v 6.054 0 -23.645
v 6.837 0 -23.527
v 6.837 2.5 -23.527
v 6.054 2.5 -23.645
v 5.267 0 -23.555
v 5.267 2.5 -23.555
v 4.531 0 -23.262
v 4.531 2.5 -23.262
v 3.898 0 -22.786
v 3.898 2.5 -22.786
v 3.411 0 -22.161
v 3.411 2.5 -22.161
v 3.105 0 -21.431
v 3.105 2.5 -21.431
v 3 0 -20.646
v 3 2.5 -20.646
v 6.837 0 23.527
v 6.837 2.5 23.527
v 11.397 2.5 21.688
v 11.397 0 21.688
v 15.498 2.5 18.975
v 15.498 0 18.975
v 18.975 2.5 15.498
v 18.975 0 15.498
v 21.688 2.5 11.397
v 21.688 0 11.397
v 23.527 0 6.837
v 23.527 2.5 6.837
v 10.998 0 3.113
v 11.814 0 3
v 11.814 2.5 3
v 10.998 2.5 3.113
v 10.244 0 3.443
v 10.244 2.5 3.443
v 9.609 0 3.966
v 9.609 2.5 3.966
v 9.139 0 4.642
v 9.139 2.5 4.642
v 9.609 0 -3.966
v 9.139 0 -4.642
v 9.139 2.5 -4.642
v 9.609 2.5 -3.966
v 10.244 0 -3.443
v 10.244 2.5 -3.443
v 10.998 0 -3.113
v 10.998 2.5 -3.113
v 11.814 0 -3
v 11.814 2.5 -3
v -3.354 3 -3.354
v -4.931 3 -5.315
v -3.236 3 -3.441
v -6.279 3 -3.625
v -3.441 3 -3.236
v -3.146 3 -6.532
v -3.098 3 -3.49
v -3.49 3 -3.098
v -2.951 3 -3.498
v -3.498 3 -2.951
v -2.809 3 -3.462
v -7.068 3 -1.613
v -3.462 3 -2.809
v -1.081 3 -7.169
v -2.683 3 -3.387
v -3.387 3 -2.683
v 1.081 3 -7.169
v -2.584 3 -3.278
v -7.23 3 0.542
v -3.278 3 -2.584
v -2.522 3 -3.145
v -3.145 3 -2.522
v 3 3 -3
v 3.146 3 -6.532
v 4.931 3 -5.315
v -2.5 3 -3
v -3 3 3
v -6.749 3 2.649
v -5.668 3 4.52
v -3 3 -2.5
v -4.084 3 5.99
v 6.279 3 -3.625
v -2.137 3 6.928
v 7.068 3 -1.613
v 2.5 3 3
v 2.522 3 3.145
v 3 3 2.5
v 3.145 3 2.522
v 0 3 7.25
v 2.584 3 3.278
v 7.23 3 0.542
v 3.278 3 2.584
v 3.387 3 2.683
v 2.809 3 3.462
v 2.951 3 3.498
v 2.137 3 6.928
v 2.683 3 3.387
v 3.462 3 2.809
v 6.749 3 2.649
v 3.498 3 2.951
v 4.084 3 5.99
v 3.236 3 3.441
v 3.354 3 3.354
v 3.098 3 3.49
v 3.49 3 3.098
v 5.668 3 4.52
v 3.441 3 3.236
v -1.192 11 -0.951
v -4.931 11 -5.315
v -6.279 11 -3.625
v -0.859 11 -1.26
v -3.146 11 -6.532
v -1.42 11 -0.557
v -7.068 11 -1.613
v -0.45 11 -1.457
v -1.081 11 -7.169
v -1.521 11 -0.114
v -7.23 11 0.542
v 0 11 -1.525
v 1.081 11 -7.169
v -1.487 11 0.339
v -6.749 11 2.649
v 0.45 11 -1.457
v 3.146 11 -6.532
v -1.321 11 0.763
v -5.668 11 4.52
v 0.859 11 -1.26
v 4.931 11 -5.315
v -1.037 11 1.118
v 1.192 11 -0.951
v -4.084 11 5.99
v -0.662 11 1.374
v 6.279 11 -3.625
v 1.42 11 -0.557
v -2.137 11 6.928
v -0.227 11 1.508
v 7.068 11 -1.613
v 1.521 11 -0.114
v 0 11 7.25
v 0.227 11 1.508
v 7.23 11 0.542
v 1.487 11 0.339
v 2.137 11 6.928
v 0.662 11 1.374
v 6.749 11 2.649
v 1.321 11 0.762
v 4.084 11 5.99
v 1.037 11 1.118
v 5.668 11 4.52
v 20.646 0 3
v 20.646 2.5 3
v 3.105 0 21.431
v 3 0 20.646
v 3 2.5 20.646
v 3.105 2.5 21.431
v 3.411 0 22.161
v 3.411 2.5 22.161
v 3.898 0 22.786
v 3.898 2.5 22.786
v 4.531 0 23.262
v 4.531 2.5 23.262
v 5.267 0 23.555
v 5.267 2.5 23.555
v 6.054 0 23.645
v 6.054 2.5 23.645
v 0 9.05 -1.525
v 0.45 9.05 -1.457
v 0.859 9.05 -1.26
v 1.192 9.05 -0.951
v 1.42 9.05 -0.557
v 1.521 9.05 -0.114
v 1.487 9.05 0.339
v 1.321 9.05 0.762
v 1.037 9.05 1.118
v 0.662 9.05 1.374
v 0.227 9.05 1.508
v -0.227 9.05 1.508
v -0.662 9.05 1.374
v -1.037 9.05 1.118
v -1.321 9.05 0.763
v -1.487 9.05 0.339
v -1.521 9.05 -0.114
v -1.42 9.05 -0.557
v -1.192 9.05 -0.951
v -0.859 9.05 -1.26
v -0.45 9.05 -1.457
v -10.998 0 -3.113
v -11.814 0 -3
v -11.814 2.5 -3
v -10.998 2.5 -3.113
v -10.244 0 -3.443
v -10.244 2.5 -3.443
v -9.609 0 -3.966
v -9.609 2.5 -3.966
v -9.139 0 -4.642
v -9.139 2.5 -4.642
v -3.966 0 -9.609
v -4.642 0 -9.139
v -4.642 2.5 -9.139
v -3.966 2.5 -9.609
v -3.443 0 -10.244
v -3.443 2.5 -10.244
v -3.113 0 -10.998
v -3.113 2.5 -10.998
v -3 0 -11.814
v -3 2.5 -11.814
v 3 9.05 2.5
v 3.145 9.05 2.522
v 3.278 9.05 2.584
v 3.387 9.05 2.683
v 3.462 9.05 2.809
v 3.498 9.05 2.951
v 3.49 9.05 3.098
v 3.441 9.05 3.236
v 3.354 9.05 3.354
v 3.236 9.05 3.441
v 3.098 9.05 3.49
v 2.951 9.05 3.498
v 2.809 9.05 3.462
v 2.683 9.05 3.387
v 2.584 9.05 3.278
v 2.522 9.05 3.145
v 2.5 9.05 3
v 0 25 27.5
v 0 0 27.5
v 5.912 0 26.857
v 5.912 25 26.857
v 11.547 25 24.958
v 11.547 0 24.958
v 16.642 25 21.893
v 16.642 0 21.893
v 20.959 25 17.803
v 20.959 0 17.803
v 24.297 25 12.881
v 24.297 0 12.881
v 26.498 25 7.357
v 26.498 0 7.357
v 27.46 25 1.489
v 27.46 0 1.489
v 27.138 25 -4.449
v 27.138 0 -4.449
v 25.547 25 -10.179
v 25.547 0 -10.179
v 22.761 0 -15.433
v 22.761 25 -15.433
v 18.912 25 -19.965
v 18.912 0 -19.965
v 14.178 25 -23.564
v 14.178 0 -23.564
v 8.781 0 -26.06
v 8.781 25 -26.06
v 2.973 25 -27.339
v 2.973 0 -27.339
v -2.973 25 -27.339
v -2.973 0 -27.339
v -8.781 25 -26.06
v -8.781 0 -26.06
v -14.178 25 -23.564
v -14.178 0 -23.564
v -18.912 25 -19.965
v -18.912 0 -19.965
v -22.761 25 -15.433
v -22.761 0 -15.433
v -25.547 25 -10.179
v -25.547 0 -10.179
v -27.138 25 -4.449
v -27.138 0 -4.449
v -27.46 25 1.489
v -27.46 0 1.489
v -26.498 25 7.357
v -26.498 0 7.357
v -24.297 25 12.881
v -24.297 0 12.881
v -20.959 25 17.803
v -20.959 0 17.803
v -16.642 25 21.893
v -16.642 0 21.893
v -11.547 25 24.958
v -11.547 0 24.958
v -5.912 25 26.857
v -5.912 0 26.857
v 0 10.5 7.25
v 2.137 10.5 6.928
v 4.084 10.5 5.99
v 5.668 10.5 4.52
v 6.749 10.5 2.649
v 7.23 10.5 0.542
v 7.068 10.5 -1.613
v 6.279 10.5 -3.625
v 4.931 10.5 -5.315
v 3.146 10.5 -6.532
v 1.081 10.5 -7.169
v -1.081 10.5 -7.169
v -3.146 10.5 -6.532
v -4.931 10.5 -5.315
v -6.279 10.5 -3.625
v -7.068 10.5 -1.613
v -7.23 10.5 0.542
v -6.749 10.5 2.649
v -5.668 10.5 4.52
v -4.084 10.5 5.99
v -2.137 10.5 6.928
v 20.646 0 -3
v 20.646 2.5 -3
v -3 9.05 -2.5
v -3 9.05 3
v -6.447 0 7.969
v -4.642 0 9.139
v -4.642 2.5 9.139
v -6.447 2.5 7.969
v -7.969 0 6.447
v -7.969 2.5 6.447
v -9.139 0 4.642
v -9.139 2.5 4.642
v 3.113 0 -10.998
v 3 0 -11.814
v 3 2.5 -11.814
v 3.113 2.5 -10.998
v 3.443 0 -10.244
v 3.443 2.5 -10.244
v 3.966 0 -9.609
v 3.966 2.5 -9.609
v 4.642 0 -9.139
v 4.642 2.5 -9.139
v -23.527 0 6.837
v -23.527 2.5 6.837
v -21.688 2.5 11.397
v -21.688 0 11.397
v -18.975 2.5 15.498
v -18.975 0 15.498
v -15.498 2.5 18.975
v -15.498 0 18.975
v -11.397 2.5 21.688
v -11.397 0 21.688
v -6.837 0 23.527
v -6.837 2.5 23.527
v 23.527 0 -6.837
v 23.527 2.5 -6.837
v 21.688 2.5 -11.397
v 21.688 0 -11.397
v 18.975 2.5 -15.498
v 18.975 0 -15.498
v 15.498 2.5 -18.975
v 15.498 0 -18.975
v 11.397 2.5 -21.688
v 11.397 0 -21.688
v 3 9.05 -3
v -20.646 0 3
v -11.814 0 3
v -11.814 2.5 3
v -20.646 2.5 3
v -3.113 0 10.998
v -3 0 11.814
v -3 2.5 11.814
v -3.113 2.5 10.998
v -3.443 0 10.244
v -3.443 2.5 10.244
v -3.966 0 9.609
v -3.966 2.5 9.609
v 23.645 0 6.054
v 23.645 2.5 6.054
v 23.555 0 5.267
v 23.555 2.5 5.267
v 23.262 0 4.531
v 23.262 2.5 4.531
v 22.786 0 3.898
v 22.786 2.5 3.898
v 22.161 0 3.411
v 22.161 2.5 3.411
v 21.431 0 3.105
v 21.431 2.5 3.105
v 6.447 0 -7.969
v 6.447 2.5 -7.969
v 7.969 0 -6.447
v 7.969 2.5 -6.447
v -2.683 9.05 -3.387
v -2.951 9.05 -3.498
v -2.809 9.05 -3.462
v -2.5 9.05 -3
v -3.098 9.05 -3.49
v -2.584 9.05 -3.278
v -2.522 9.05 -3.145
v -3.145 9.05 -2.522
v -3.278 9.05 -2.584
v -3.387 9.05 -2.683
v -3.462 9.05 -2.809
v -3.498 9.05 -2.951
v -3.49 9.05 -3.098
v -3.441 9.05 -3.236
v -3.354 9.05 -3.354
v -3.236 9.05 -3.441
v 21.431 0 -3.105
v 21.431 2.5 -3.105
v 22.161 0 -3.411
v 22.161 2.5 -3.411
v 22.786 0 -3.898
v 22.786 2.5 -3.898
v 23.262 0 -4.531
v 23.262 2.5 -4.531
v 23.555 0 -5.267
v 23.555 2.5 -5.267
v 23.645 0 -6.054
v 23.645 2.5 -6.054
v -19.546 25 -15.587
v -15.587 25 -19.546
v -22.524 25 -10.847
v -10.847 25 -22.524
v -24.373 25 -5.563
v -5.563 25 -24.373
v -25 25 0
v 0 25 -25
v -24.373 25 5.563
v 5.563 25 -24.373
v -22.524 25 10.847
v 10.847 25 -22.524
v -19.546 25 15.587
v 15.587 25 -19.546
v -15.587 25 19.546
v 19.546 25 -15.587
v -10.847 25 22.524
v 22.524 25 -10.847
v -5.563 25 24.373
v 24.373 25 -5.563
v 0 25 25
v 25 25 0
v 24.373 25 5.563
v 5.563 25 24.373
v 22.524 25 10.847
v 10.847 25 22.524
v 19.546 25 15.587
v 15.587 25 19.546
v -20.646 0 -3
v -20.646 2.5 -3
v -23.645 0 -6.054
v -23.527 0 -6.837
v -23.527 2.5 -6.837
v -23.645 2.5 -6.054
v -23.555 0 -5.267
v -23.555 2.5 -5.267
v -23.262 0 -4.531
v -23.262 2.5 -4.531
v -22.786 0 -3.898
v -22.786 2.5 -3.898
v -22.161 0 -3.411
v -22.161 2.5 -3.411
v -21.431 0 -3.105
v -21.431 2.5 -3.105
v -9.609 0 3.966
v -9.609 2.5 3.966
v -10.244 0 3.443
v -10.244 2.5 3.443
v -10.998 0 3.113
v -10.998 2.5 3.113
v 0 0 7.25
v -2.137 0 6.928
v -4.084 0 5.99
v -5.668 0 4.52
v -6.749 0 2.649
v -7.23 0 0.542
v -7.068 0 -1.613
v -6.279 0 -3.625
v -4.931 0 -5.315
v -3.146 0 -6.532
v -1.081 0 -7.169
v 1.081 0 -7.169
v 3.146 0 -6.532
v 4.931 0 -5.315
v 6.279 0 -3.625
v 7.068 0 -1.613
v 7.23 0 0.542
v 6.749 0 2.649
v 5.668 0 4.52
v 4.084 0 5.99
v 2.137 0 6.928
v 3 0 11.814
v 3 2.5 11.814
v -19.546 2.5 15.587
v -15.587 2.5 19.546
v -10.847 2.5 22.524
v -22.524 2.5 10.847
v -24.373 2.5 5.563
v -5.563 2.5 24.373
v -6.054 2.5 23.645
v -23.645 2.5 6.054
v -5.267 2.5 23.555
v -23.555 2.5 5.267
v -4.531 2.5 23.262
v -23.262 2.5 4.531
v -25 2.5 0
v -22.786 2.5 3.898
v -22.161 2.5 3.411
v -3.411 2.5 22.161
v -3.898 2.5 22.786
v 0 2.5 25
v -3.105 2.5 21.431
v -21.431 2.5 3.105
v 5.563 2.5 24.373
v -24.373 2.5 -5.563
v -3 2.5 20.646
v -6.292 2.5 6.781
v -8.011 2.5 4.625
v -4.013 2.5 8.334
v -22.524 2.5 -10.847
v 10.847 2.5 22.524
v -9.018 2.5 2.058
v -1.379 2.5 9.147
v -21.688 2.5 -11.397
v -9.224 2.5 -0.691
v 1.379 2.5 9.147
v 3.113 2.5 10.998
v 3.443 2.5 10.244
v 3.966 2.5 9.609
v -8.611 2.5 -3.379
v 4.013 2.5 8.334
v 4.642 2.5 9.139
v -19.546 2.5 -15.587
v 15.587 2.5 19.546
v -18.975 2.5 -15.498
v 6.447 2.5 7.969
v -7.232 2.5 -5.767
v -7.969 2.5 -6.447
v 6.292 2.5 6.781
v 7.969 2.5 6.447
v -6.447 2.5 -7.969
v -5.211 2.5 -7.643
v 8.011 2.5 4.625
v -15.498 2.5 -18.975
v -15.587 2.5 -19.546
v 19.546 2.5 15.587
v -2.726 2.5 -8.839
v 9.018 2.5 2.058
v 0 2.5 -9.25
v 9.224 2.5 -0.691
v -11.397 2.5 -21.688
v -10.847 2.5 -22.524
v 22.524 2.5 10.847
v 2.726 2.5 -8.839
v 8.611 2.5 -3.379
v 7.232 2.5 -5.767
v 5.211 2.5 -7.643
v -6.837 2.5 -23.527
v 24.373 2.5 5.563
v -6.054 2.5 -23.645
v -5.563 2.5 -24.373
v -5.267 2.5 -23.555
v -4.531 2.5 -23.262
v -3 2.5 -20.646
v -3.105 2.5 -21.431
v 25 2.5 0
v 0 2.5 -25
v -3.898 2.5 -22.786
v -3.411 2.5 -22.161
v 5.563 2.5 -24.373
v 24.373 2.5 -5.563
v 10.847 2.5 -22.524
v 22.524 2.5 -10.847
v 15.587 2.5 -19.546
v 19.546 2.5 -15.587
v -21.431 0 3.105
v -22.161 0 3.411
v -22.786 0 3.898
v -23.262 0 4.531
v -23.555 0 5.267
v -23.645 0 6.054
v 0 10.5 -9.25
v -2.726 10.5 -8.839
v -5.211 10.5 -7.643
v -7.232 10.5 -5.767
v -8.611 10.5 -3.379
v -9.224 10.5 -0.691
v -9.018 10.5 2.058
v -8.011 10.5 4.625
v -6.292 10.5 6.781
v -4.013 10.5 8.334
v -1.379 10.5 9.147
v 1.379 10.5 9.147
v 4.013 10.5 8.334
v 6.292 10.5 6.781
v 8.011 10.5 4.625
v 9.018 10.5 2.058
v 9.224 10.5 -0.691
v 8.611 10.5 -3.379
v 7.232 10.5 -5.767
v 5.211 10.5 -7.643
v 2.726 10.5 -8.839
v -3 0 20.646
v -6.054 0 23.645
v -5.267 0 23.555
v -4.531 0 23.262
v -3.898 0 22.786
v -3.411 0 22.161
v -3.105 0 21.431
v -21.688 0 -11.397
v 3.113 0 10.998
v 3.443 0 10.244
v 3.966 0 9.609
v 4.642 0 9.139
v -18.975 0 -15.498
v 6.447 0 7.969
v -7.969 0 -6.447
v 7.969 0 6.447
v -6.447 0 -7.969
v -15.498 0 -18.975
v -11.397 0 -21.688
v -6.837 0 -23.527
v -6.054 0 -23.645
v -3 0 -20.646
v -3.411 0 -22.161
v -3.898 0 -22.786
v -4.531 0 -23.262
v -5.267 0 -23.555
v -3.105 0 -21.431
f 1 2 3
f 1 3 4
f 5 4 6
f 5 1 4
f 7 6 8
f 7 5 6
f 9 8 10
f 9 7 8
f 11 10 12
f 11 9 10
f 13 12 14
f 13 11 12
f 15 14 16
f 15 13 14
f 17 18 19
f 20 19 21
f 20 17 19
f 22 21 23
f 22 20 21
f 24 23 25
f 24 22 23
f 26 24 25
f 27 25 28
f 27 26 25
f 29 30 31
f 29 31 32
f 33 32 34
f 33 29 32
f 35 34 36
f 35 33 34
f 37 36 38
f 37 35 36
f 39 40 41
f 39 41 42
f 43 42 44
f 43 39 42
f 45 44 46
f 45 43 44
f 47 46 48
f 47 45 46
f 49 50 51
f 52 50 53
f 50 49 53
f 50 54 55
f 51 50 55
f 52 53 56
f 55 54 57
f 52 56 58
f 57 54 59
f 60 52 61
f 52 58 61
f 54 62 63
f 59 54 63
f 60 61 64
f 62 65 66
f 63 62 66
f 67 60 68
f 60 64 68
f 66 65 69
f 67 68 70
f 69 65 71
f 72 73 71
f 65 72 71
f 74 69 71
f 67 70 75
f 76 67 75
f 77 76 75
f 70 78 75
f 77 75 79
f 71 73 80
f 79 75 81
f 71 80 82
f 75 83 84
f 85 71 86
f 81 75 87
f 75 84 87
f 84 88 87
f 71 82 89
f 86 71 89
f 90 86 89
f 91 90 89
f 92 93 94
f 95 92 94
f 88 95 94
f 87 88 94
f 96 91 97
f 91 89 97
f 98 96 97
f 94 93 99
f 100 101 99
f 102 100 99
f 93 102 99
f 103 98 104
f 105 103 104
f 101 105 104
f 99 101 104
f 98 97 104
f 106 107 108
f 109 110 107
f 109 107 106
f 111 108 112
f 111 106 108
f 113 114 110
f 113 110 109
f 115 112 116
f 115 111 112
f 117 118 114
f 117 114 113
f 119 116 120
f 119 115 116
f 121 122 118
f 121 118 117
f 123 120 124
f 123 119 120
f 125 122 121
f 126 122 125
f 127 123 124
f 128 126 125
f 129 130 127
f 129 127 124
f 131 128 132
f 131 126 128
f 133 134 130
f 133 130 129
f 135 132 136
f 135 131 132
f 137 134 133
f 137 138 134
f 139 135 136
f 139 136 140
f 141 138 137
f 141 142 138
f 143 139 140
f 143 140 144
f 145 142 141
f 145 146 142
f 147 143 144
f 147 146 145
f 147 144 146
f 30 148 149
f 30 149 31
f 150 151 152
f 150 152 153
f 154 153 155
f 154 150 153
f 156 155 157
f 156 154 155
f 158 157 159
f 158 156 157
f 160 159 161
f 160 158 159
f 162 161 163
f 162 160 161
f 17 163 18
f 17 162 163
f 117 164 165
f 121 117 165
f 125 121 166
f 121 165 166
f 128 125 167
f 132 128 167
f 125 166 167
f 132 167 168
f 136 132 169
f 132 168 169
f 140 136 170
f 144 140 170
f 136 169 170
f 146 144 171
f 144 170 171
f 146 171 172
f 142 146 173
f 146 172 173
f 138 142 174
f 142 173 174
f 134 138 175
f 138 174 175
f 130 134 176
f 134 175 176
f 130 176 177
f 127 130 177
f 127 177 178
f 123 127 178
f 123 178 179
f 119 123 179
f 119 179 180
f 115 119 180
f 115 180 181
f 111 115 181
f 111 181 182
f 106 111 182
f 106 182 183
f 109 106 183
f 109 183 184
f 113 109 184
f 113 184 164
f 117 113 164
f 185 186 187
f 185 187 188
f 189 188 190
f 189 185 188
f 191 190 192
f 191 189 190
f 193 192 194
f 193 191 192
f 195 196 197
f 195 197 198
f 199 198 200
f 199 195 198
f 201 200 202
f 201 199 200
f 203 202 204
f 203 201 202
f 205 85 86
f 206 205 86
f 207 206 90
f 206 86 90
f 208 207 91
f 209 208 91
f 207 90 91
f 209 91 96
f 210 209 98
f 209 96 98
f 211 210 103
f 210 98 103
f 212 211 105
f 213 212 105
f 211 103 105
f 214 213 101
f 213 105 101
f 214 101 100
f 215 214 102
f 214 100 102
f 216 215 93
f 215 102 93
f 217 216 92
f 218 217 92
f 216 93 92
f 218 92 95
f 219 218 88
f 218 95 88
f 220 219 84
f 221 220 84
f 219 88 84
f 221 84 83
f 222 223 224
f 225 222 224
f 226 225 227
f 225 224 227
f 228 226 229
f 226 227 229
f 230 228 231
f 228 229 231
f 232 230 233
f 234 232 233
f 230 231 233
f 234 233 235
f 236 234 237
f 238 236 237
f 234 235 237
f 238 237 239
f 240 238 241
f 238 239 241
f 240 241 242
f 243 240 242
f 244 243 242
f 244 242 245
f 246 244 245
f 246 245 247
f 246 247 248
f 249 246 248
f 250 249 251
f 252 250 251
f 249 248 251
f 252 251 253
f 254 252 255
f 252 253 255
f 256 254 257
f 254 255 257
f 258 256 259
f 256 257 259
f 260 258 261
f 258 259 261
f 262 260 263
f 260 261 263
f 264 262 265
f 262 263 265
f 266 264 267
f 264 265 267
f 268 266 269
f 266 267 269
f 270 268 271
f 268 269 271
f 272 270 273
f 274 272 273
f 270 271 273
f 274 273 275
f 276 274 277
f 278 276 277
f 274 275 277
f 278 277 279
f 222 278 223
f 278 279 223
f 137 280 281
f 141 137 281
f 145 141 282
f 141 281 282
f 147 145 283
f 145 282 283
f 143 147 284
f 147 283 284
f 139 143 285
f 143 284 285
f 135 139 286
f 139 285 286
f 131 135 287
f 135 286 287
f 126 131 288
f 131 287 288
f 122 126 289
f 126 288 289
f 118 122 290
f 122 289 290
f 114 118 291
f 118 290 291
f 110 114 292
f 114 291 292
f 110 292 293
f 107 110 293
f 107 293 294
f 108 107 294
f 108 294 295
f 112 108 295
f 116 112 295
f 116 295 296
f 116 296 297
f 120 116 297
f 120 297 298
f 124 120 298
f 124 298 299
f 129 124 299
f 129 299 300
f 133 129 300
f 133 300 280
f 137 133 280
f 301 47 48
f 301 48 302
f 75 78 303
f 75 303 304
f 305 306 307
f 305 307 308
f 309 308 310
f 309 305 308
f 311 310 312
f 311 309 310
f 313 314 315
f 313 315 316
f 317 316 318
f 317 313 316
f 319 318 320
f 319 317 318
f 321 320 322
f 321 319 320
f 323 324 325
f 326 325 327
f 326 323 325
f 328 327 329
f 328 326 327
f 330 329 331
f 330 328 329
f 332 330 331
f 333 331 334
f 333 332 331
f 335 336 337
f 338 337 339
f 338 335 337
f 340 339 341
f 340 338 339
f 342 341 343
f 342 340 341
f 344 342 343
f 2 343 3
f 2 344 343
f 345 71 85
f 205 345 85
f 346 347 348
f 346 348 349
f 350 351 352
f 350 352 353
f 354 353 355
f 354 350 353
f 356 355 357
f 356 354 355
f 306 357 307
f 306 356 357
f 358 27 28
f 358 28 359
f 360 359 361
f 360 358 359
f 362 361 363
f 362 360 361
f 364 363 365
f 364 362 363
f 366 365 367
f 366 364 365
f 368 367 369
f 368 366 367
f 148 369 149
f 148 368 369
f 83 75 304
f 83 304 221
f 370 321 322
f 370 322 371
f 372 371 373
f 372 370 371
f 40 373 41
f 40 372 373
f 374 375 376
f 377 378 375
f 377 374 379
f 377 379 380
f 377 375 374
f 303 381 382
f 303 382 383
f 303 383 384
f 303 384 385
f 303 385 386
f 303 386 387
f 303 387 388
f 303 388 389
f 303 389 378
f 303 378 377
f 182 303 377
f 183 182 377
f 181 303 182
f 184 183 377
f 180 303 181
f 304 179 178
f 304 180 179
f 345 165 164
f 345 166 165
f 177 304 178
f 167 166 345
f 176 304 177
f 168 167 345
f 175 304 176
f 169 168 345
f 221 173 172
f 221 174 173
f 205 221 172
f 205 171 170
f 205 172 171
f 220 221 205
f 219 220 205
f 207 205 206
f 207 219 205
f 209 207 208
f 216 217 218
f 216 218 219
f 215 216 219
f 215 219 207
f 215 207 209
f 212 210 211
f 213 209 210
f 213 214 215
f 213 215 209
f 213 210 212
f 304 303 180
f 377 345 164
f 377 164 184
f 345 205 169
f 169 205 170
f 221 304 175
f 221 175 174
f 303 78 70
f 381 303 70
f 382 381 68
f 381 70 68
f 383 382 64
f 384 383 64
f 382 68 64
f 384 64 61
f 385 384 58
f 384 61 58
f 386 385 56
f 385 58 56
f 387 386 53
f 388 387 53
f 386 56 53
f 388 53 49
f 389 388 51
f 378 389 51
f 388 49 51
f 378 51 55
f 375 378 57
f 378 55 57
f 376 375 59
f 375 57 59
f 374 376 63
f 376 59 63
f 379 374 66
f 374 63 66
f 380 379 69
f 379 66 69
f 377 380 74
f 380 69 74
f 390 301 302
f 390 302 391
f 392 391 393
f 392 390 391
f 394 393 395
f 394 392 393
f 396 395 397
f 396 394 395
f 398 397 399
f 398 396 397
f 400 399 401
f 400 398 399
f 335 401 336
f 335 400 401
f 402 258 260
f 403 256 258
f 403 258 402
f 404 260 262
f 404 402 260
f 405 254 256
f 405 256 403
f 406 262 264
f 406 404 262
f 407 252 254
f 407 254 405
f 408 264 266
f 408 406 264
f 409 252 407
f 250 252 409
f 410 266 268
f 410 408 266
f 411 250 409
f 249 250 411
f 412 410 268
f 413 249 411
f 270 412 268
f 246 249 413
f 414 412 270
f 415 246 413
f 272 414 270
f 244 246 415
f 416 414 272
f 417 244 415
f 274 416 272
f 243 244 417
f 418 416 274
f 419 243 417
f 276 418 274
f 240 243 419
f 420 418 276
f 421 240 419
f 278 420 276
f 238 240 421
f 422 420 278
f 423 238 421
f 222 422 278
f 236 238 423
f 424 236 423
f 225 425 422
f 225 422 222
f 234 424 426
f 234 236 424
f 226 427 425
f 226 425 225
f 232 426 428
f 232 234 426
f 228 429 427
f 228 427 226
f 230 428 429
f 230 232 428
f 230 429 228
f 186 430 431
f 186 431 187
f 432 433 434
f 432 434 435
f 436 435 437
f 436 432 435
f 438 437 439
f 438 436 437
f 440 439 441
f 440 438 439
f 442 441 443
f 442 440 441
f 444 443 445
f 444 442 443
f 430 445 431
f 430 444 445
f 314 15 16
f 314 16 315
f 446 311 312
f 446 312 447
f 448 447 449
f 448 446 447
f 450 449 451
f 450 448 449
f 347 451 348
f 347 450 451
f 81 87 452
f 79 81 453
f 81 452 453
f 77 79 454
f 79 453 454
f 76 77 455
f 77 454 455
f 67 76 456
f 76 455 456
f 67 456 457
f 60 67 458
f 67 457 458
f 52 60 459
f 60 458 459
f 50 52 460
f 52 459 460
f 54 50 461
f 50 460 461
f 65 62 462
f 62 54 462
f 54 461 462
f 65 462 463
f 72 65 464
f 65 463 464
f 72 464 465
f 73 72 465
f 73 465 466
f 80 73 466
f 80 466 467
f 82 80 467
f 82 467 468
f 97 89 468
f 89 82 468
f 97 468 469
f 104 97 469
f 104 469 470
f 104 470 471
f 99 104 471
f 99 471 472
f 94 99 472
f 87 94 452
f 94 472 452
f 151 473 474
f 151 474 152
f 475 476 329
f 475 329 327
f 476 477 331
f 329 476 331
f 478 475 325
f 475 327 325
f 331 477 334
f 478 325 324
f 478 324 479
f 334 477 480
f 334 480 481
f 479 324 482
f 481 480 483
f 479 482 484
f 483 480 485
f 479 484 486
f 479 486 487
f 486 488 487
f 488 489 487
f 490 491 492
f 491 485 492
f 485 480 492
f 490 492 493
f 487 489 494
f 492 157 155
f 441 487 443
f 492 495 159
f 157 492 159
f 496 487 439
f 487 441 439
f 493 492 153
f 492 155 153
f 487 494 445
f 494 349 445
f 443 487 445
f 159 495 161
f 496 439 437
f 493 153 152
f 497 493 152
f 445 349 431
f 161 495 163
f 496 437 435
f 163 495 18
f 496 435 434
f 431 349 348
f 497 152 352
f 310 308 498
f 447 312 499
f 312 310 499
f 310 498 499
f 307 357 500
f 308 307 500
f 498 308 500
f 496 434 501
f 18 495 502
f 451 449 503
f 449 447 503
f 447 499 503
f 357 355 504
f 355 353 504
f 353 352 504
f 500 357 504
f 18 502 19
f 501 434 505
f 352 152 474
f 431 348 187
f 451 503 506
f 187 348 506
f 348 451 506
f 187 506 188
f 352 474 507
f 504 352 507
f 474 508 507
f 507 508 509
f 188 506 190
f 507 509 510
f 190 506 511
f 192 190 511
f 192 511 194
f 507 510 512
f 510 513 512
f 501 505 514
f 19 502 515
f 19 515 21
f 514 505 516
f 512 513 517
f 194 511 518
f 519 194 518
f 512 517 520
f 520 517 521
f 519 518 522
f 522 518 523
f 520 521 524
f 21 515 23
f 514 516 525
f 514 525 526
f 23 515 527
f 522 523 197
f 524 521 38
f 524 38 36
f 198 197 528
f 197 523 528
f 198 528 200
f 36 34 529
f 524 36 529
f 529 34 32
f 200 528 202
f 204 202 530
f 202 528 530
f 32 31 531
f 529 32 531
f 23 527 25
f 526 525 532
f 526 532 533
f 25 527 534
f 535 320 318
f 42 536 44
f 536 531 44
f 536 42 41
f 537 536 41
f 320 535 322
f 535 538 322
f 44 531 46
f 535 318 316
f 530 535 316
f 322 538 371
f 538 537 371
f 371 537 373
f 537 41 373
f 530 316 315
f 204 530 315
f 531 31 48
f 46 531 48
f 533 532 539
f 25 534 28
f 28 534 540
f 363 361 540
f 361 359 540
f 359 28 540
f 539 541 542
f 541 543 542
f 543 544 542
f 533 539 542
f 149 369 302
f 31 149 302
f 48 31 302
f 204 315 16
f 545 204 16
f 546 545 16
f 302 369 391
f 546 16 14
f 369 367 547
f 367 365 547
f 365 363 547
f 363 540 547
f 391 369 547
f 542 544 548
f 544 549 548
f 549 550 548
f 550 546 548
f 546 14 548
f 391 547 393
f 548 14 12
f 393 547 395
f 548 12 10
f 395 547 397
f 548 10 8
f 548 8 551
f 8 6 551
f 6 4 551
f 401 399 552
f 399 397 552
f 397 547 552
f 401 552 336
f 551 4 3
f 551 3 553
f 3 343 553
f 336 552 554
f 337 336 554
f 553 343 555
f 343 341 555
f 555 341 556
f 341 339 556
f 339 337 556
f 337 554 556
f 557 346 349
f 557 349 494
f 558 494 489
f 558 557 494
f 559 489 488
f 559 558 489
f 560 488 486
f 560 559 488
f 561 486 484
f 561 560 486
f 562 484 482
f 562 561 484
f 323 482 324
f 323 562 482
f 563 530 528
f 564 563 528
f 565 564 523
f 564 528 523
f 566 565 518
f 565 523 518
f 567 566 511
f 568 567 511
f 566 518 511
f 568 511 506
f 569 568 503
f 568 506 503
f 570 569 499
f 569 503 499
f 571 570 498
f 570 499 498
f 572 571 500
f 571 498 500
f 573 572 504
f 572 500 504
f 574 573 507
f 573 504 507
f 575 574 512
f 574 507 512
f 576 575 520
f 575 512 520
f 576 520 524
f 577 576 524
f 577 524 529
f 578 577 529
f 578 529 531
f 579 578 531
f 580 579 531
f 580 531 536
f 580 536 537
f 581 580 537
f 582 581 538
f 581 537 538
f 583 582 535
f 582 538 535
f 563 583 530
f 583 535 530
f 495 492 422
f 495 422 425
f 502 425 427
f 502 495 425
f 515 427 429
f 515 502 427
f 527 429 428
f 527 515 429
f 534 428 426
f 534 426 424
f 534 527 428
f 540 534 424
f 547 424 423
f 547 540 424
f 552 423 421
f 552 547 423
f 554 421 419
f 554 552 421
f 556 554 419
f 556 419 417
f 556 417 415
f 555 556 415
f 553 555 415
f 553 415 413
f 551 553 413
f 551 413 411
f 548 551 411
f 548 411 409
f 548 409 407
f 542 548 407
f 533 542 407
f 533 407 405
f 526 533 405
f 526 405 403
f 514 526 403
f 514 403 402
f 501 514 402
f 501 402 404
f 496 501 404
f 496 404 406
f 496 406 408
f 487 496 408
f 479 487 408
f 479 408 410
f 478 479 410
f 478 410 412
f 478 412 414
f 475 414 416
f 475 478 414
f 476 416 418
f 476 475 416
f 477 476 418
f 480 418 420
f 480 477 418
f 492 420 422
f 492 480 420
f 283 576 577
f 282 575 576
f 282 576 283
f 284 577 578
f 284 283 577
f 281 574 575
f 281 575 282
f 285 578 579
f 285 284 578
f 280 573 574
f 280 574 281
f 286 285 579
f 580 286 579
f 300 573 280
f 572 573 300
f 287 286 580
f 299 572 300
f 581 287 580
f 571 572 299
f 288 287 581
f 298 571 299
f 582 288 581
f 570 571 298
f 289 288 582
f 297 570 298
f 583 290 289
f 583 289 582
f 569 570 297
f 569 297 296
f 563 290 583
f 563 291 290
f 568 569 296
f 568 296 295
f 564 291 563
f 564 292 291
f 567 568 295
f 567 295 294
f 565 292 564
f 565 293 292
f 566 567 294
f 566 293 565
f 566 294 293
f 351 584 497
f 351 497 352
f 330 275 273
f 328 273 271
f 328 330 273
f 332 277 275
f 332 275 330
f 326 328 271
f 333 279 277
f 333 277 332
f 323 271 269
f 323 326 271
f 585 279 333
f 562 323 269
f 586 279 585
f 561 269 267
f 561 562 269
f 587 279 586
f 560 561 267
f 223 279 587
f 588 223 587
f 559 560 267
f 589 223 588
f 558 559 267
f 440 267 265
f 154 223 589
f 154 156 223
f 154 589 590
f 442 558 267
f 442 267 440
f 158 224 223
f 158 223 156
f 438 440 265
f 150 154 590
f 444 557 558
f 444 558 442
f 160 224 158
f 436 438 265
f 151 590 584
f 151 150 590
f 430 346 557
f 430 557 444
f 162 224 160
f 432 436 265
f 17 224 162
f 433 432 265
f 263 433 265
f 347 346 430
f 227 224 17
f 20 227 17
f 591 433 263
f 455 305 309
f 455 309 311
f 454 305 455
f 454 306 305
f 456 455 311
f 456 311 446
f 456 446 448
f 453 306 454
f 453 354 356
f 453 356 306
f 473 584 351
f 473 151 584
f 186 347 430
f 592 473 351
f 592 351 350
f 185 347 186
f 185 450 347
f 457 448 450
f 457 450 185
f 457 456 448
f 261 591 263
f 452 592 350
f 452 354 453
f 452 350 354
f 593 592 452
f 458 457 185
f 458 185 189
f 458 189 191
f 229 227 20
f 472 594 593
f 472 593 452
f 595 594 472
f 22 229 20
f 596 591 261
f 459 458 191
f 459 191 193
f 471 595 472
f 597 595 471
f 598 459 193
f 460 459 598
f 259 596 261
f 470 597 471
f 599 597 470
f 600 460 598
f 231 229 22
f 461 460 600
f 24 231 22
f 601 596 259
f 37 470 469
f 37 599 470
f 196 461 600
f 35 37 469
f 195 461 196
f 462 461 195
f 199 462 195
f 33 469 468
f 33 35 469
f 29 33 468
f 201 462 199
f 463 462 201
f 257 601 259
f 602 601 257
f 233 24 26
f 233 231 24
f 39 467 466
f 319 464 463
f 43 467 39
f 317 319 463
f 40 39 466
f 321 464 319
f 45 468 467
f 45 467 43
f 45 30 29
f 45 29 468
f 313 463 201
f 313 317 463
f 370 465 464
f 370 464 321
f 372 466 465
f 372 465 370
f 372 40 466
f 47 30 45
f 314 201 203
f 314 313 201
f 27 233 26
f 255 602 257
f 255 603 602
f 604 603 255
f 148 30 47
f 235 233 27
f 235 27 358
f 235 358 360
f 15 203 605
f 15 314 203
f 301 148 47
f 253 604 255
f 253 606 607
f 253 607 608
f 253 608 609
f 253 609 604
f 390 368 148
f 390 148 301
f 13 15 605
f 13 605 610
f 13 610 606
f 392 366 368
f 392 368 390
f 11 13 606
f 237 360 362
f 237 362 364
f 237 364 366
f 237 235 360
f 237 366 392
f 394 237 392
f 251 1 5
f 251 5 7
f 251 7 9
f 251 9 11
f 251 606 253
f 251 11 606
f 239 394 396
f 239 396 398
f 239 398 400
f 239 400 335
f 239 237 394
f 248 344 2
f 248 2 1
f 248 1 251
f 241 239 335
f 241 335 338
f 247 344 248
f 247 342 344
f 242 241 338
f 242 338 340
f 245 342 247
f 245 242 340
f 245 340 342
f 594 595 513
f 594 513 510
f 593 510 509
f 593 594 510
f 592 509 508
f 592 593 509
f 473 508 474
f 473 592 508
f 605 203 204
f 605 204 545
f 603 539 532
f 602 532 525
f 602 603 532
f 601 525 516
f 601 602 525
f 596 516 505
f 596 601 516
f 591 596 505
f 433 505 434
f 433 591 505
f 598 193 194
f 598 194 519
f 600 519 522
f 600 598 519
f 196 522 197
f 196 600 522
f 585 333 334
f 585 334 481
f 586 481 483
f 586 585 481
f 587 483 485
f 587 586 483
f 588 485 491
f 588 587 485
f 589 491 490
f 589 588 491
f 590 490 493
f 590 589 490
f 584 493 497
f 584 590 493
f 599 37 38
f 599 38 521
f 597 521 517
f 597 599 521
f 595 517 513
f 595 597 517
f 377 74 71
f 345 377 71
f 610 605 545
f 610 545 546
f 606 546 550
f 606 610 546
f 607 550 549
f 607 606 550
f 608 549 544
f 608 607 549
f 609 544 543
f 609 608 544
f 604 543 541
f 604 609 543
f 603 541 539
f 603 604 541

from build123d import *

# Parameters (mm, degrees)
SKETCH1_R           = 27.5
SKETCH1_R_2         = 25
BOSS_EXTRUDE1_DEPTH = 25
SKETCH2_R           = 25
BOSS_EXTRUDE2_DEPTH = 2.5
BOSS_EXTRUDE3_START = 0.5
SKETCH3_R           = 7.25
BOSS_EXTRUDE3_DEPTH = 8
SKETCH3_3_R         = 9.25
SKETCH3_3_R_2       = 7.25
BOSS_EXTRUDE4_DEPTH = 8
SKETCH4_R           = 7.25
CUT_EXTRUDE1_DEPTH  = 3
CUT_EXTRUDE3_DEPTH  = 6
CUT_EXTRUDE5_DEPTH  = 6.05
SKETCH7_R           = 1.525
CUT_EXTRUDE6_DEPTH  = 6.05


with BuildPart() as part:
    # Sketch1 → Boss-Extrude1 (new body)
    with BuildSketch(Plane(origin=(0, 0, 0), x_dir=(1, 0, 0), z_dir=(0, 1, 0))):
        Circle(SKETCH1_R)
        Circle(SKETCH1_R_2, mode=Mode.SUBTRACT)
    extrude(amount=BOSS_EXTRUDE1_DEPTH)

    # Sketch2 → Boss-Extrude2 (add)
    with BuildSketch(Plane.XZ):
        Circle(SKETCH2_R)
    extrude(amount=-BOSS_EXTRUDE2_DEPTH)



with BuildPart() as body_2:
    # Sketch3 → Boss-Extrude3 (new body)
    with BuildSketch(Plane(origin=(0, 2.5, 0), x_dir=(1, 0, 0), z_dir=(0, 1, 0)).offset(BOSS_EXTRUDE3_START)):
        Circle(SKETCH3_R)
    extrude(amount=BOSS_EXTRUDE3_DEPTH)


with BuildPart() as part_1:
    add(part.part)

    add(body_2.part)  # Boss-Extrude4 merges body 2
    # Sketch3<3> → Boss-Extrude4 (add)
    with BuildSketch(Plane(origin=(0, 2.5, 0), x_dir=(1, 0, 0), z_dir=(0, 1, 0))):
        Circle(SKETCH3_3_R)
        Circle(SKETCH3_3_R_2, mode=Mode.SUBTRACT)
    extrude(amount=BOSS_EXTRUDE4_DEPTH)

    # Sketch4 → Cut-Extrude1 (cut)
    with BuildSketch(Plane.XZ):
        Circle(SKETCH4_R)
    extrude(amount=-CUT_EXTRUDE1_DEPTH, mode=Mode.SUBTRACT)

    # Sketch5 → Cut-Extrude3 (cut)
    with BuildSketch(Plane.XZ):
        with BuildLine():
            Line((11.813657351, -3), (20.645822822, -3))
            ThreePointArc((20.645822822, -3), (23.044950571, -4.198837585), (23.526635309, -6.837209302))
            ThreePointArc((23.526635309, -6.837209302), (17.324116139, -17.324116139), (6.837209302, -23.526635309))
            ThreePointArc((6.837209302, -23.526635309), (4.198837585, -23.044950571), (3, -20.645822822))
            Line((3, -20.645822822), (3, -11.813657351))
            ThreePointArc((3, -11.813657351), (3.443100344, -10.244497018), (4.641509434, -9.138867007))
            ThreePointArc((4.641509434, -9.138867007), (7.247844507, -7.247844507), (9.138867007, -4.641509434))
            ThreePointArc((9.138867007, -4.641509434), (10.244497018, -3.443100344), (11.813657351, -3))
        make_face()
        with BuildLine():
            Line((-3, -11.813657351), (-3, -20.645822822))
            ThreePointArc((-3, -20.645822822), (-4.198837585, -23.044950571), (-6.837209302, -23.526635309))
            ThreePointArc((-6.837209302, -23.526635309), (-17.324116139, -17.324116139), (-23.526635309, -6.837209302))
            ThreePointArc((-23.526635309, -6.837209302), (-23.044950571, -4.198837585), (-20.645822822, -3))
            Line((-20.645822822, -3), (-11.813657351, -3))
            ThreePointArc((-11.813657351, -3), (-10.244497018, -3.443100344), (-9.138867007, -4.641509434))
            ThreePointArc((-9.138867007, -4.641509434), (-7.247844507, -7.247844507), (-4.641509434, -9.138867007))
            ThreePointArc((-4.641509434, -9.138867007), (-3.443100344, -10.244497018), (-3, -11.813657351))
        make_face()
        with BuildLine():
            Line((-11.813657351, 3), (-20.645822822, 3))
            ThreePointArc((-20.645822822, 3), (-23.044950571, 4.198837585), (-23.526635309, 6.837209302))
            ThreePointArc((-23.526635309, 6.837209302), (-17.324116139, 17.324116139), (-6.837209302, 23.526635309))
            ThreePointArc((-6.837209302, 23.526635309), (-4.198837585, 23.044950571), (-3, 20.645822822))
            Line((-3, 20.645822822), (-3, 11.813657351))
            ThreePointArc((-3, 11.813657351), (-3.443100344, 10.244497018), (-4.641509434, 9.138867007))
            ThreePointArc((-4.641509434, 9.138867007), (-7.247844507, 7.247844507), (-9.138867007, 4.641509434))
            ThreePointArc((-9.138867007, 4.641509434), (-10.244497018, 3.443100344), (-11.813657351, 3))
        make_face()
        with BuildLine():
            Line((3, 11.813657351), (3, 20.645822822))
            ThreePointArc((3, 20.645822822), (4.198837585, 23.044950571), (6.837209302, 23.526635309))
            ThreePointArc((6.837209302, 23.526635309), (17.324116139, 17.324116139), (23.526635309, 6.837209302))
            ThreePointArc((23.526635309, 6.837209302), (23.044950571, 4.198837585), (20.645822822, 3))
            Line((20.645822822, 3), (11.813657351, 3))
            ThreePointArc((11.813657351, 3), (10.244497018, 3.443100344), (9.138867007, 4.641509434))
            ThreePointArc((9.138867007, 4.641509434), (7.247844507, 7.247844507), (4.641509434, 9.138867007))
            ThreePointArc((4.641509434, 9.138867007), (3.443100344, 10.244497018), (3, 11.813657351))
        make_face()
    extrude(amount=-CUT_EXTRUDE3_DEPTH, mode=Mode.SUBTRACT)

    # Sketch6 → Cut-Extrude5 (cut)
    with BuildSketch(Plane.XZ.offset(-3)):
        with BuildLine():
            ThreePointArc((-3, -2.5), (-3.353553391, -3.353553391), (-2.5, -3))
            Line((-2.5, -3), (3, -3))
            Line((3, -3), (3, 2.5))
            ThreePointArc((3, 2.5), (3.353553391, 3.353553391), (2.5, 3))
            Line((2.5, 3), (-3, 3))
            Line((-3, 3), (-3, -2.5))
        make_face()
    extrude(amount=-CUT_EXTRUDE5_DEPTH, mode=Mode.SUBTRACT)

    # Sketch7 → Cut-Extrude6 (cut)
    with BuildSketch(Plane.XZ.offset(-9.05)):
        Circle(SKETCH7_R)
    extrude(amount=-CUT_EXTRUDE6_DEPTH, mode=Mode.SUBTRACT)


solid = part_1.part
